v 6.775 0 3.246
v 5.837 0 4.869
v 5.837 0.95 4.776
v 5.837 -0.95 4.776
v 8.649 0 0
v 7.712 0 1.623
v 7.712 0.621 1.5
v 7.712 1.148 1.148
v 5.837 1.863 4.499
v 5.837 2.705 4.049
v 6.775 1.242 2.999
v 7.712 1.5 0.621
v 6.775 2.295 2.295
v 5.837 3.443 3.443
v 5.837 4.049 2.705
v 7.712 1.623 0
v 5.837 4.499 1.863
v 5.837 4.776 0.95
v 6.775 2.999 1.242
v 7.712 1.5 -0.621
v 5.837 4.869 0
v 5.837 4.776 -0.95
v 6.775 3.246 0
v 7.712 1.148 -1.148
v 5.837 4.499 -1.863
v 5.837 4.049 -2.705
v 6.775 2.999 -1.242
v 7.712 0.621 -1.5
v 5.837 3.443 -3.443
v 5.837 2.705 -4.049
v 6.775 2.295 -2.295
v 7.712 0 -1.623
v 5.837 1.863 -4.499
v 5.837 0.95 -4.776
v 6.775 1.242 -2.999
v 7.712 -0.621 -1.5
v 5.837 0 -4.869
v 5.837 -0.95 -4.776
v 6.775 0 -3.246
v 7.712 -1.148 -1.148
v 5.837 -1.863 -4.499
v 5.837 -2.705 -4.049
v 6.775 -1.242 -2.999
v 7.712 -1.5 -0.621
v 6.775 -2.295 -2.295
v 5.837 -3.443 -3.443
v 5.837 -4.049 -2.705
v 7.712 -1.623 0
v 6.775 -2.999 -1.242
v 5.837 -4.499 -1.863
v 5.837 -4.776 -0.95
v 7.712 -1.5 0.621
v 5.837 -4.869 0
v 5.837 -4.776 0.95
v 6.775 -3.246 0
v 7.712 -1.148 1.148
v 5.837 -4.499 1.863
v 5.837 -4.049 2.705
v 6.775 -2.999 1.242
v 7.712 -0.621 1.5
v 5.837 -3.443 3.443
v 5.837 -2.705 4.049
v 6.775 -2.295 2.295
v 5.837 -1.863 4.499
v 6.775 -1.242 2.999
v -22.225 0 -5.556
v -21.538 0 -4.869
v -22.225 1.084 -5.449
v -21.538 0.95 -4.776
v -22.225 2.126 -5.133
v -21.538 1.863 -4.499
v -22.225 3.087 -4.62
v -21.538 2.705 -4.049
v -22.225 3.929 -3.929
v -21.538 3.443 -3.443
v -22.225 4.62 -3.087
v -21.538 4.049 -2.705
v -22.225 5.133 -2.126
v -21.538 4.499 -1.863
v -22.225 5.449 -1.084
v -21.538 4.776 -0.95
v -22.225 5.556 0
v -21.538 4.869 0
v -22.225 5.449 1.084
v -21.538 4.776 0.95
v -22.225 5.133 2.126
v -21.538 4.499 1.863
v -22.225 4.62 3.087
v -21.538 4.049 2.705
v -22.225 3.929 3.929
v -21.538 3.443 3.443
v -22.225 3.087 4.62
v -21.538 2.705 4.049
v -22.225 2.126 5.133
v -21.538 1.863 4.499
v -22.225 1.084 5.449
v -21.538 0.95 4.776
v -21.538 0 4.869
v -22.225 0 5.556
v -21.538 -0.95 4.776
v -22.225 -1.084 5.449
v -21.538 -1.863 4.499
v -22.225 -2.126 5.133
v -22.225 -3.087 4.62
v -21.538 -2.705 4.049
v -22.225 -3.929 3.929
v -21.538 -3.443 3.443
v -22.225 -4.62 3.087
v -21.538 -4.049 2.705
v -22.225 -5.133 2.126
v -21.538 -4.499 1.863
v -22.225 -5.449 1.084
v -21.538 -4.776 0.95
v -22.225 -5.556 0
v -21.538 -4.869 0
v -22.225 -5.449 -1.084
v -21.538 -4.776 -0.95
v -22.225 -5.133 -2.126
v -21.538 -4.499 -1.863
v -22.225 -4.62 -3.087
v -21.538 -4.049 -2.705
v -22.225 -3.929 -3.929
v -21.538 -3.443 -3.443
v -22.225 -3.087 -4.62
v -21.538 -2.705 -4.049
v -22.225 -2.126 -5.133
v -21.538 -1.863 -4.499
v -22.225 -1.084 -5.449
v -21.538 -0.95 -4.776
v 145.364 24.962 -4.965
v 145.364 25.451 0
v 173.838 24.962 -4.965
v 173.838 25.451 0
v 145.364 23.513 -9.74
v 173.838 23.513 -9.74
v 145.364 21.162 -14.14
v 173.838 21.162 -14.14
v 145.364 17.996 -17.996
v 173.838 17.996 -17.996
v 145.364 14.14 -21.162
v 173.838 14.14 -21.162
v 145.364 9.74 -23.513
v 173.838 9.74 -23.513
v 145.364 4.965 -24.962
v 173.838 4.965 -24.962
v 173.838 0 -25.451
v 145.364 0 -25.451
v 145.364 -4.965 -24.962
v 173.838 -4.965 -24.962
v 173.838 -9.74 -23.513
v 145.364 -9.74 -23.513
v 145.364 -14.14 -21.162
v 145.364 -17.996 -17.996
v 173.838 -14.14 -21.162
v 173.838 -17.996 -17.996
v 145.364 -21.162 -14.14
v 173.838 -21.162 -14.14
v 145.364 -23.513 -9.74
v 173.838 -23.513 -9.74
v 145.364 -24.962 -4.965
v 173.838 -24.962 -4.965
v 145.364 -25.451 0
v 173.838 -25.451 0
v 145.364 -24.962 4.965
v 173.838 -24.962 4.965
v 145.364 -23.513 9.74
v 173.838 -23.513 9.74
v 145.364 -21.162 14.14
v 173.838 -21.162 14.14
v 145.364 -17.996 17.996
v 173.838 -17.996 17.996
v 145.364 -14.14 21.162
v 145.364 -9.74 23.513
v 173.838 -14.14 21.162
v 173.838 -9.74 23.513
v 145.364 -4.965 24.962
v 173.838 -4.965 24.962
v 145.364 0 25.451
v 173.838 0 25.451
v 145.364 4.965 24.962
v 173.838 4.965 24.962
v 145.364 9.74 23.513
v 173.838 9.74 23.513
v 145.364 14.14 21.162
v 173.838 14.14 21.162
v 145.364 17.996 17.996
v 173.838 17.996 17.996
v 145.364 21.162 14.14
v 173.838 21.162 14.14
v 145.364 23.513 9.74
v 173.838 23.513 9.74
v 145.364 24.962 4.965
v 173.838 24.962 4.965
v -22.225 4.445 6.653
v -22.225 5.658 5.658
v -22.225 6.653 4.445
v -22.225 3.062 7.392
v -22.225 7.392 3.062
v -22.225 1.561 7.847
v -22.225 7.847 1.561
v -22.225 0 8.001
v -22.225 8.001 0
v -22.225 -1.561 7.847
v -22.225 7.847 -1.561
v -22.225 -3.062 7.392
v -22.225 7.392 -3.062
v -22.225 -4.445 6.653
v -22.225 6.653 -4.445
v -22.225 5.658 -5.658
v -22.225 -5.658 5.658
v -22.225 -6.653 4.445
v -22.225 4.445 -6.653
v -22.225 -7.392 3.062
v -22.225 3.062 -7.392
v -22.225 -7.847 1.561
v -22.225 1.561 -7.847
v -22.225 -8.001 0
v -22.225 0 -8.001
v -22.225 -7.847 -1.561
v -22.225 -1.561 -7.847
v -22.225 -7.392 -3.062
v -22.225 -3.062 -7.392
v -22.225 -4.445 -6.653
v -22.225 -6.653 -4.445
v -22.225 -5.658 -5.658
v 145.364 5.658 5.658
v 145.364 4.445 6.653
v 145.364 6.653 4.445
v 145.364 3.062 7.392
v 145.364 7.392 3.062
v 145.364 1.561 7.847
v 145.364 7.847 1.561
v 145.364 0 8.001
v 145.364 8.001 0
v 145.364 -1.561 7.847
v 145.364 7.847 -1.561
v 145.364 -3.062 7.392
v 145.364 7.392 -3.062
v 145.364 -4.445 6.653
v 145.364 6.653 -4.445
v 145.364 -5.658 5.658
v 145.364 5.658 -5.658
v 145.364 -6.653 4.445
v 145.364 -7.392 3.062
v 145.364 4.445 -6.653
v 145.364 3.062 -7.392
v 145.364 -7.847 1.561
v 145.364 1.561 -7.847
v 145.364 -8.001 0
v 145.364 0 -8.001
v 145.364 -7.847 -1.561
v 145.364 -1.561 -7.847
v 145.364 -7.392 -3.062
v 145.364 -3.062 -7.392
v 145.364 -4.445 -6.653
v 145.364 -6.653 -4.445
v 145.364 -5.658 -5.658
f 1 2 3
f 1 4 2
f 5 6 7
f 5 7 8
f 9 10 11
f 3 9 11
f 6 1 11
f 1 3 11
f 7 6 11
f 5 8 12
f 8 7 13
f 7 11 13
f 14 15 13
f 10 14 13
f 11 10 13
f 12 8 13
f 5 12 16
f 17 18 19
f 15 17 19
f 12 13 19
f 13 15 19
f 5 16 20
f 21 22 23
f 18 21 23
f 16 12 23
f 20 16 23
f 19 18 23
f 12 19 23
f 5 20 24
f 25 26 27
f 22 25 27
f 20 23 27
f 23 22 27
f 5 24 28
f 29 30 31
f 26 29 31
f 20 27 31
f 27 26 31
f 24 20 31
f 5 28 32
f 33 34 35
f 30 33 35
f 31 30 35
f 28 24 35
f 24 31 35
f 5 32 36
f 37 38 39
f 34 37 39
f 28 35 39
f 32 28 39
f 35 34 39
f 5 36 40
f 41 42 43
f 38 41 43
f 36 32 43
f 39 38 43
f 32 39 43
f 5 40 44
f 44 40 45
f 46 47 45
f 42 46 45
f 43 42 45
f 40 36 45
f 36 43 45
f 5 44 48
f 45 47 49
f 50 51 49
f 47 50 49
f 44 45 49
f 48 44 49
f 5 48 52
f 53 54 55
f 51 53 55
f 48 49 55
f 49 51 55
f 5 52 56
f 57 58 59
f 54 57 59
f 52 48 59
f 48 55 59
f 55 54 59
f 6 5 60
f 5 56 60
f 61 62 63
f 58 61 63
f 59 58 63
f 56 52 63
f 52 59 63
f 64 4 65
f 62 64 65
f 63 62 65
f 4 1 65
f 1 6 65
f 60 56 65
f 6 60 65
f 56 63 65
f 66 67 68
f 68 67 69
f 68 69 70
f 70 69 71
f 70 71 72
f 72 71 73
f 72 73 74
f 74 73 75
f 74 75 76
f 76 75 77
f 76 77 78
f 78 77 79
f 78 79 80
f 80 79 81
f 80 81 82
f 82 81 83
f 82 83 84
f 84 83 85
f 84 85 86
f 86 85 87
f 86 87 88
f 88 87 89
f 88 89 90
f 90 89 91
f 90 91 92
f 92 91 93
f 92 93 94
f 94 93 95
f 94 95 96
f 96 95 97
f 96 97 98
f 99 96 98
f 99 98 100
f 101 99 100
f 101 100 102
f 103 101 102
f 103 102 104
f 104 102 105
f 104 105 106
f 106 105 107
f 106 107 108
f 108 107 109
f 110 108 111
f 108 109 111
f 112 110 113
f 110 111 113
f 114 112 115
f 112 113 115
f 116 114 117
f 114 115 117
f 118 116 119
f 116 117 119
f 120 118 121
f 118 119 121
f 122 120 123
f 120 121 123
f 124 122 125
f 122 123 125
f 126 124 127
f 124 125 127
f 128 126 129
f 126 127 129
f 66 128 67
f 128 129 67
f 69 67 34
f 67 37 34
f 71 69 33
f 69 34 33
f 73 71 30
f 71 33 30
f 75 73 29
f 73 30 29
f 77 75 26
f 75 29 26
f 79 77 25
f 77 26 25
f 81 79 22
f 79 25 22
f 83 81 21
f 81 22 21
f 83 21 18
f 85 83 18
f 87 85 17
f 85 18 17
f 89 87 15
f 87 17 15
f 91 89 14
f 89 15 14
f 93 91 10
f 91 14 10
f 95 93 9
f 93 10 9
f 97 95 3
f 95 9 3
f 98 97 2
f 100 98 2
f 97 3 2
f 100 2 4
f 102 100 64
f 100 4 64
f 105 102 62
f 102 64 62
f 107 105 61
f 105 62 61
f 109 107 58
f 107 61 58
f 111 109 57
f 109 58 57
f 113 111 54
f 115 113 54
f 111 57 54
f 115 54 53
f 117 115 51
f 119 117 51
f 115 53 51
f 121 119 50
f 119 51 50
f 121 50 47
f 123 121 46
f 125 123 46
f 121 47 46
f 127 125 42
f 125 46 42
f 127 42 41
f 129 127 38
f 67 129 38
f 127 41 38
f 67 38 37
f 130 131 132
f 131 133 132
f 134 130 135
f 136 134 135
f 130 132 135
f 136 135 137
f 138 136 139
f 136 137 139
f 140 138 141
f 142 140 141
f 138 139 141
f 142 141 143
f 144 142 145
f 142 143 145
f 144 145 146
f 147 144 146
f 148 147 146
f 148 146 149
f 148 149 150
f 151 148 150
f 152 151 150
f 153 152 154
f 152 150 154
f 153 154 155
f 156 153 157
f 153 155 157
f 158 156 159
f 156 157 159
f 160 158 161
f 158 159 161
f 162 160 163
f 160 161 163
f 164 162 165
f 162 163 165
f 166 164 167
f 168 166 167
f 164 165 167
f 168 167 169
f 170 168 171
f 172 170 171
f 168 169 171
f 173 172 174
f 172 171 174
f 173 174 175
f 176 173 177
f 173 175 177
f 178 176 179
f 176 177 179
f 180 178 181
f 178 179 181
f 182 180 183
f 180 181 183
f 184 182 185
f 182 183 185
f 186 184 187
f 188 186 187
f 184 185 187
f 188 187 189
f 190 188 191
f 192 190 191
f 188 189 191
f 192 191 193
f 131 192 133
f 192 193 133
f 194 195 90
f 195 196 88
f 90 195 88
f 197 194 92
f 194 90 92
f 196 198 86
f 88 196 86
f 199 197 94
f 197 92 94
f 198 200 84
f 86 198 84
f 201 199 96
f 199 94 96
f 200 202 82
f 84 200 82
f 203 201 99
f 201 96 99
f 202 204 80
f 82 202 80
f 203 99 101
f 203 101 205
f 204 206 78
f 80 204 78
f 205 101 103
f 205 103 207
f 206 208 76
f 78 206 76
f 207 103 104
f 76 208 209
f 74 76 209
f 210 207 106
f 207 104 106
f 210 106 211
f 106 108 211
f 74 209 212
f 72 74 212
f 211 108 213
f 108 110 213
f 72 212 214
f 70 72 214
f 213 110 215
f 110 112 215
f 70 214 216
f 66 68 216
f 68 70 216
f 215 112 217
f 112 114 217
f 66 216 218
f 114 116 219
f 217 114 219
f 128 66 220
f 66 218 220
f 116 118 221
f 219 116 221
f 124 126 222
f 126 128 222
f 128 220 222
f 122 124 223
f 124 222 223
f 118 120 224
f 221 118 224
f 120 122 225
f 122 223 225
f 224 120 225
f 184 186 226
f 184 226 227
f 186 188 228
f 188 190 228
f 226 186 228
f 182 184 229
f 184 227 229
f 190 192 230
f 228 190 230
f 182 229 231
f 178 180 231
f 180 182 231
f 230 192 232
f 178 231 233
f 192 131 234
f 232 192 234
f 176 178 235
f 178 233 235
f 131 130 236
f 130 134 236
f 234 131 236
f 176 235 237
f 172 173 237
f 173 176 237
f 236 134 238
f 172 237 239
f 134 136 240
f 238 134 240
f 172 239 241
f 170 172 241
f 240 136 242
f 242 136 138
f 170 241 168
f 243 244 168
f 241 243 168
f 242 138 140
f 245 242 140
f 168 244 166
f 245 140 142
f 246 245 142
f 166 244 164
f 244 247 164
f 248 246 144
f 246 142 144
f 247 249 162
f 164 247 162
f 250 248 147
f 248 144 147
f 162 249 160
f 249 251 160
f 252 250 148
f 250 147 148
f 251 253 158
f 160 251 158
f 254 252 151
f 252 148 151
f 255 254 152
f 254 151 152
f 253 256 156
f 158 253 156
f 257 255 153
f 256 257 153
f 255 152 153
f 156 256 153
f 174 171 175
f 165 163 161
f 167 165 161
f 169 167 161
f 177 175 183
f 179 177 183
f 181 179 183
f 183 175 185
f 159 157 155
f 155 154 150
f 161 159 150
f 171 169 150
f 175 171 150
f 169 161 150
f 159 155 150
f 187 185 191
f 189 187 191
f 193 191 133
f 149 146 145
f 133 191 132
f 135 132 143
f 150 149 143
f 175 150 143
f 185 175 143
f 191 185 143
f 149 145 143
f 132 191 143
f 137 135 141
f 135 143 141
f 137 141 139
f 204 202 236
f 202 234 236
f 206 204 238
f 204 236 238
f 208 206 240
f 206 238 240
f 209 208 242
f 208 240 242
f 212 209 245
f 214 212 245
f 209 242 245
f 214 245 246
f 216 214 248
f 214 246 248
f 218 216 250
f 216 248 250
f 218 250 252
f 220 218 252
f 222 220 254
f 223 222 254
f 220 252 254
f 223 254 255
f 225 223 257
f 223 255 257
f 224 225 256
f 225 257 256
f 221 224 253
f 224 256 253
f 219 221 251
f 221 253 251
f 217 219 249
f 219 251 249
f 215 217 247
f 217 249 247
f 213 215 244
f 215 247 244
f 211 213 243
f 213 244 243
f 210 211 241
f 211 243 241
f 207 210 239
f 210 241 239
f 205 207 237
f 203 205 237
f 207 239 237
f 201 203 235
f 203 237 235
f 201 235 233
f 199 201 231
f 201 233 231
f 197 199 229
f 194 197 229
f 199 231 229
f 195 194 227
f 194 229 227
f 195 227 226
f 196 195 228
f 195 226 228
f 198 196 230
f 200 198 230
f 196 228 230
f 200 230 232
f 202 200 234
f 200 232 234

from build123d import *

# Parameters (mm, degrees)
HOLE1_D           = 9.73836
HOLE1_DEPTH       = 28.062477616
HOLE1_CSINK_D     = 11.1125
HOLE1_CSINK_ANGLE = 90
HOLE1_TIP         = 2.811222384


with BuildPart() as part:
    # Sketch1 → Revolve1 (revolve)
    with BuildSketch(Plane.XY):
        Polygon((-22.225, 0), (-22.225, 8.001), (145.3642, 8.001), (145.3642, 25.4508), (173.8376, 25.4508), (173.8376, 0), align=None)
    revolve(axis=Axis((173.8376, 0, 0), (-1, 0, 0)))

    # Hole1
    with Locations(Plane.ZY.offset(22.225)):
        with Locations((0, 0)):
            CounterSinkHole(HOLE1_D / 2, HOLE1_CSINK_D / 2, depth=HOLE1_DEPTH, counter_sink_angle=HOLE1_CSINK_ANGLE)
            with Locations((0, 0, -(HOLE1_DEPTH + HOLE1_TIP / 2))):  # 120° drill point
                Cone(0, HOLE1_D / 2, HOLE1_TIP, mode=Mode.SUBTRACT)


solid = part.part
